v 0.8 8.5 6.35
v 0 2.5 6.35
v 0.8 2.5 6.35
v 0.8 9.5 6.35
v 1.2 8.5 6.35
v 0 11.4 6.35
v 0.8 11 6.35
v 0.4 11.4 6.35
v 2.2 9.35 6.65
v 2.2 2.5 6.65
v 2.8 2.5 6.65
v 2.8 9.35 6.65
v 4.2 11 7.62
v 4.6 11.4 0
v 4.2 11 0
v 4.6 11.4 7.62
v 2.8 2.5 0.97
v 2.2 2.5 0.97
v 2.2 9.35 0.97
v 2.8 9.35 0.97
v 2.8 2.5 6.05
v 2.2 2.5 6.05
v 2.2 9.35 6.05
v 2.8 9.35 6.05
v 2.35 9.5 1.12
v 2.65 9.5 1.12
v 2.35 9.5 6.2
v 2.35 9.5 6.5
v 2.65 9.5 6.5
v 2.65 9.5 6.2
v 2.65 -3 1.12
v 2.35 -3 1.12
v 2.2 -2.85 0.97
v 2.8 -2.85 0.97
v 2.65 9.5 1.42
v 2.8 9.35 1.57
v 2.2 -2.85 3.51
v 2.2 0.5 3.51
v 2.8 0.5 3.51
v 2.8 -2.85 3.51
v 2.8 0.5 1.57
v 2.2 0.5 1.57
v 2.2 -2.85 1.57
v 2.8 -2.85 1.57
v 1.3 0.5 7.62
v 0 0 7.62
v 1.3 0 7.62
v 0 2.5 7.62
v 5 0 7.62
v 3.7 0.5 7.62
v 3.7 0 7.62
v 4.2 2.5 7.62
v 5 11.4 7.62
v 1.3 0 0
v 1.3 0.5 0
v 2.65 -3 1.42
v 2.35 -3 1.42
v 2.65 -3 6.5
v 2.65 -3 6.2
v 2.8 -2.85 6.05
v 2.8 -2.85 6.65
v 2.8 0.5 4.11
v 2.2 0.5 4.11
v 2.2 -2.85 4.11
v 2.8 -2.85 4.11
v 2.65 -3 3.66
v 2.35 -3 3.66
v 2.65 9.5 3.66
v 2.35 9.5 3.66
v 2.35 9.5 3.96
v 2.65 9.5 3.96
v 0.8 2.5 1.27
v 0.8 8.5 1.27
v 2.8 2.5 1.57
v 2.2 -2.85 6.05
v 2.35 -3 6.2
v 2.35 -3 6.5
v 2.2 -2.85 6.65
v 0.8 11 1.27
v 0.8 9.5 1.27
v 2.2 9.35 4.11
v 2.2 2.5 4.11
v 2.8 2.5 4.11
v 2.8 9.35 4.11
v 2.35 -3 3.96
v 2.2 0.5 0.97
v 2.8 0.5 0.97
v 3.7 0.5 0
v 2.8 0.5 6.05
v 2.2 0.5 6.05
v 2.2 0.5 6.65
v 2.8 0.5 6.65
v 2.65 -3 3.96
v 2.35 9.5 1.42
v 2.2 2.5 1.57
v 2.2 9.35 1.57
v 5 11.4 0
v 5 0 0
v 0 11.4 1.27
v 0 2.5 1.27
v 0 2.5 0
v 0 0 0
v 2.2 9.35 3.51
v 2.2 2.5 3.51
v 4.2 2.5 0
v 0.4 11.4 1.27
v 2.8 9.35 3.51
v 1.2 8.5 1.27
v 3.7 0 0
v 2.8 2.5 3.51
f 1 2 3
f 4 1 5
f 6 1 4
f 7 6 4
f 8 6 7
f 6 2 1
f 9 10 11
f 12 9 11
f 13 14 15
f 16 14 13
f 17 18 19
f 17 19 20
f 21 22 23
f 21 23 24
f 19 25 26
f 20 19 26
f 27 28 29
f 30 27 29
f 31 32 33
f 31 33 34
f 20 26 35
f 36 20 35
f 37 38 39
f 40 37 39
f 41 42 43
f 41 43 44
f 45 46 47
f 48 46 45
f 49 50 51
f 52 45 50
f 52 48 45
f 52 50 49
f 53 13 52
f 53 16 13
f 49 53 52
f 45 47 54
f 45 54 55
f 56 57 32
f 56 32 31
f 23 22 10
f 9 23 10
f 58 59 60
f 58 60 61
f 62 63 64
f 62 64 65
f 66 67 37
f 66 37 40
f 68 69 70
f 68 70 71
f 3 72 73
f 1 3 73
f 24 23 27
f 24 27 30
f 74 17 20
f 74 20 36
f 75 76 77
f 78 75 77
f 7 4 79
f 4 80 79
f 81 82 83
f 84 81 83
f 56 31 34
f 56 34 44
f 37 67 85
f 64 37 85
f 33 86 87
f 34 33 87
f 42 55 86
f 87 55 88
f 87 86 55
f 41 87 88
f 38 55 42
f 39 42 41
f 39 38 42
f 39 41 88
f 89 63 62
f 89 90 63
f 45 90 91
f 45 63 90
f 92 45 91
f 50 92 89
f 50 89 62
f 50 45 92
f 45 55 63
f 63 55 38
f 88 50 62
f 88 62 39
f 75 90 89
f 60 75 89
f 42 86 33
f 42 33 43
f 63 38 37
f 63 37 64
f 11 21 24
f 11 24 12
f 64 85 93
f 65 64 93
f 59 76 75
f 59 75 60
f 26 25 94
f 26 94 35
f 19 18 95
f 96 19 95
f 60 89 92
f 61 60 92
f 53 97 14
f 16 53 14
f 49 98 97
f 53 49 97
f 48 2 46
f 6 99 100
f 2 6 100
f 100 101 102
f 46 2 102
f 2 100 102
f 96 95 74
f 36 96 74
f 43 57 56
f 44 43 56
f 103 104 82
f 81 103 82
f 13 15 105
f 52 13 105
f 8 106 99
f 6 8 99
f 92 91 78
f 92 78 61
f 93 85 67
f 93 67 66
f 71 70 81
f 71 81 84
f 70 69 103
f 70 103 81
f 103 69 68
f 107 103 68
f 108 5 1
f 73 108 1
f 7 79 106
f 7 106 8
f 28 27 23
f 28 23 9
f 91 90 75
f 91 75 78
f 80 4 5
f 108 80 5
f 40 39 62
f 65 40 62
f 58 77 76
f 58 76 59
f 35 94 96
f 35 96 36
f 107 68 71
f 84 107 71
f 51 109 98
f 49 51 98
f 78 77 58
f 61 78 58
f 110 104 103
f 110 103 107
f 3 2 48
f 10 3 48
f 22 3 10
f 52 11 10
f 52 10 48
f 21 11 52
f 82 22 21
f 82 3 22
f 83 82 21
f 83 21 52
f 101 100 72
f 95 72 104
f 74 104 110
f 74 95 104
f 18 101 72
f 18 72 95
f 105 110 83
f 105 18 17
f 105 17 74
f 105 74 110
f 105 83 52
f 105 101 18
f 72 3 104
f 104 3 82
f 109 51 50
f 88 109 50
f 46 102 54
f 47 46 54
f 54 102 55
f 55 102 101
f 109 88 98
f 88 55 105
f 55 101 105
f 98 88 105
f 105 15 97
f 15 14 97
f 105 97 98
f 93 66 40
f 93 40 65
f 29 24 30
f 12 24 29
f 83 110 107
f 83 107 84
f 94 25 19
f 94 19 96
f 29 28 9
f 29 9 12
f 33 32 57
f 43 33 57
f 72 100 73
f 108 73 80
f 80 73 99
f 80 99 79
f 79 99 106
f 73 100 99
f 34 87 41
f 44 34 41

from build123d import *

# Parameters (mm, degrees)
BOSS_EXTRU_1_DEPTH      = 7.62
ESQUISSE3_W             = 0.8
ESQUISSE3_H             = 1.27
ENL_V_MAT_EXTRU_1_DEPTH = 8.9
ESQUISSE4_W             = 2.4
ESQUISSE4_H             = 0.5
ENL_V_MAT_EXTRU_2_DEPTH = 8.62
ESQUISSE2_W             = 0.6
ESQUISSE2_H             = 0.6
BOSS_EXTRU_2_DEPTH      = 3.5
BOSS_EXTRU_2_DEPTH_BACK = 9
BOSS_EXTRU_3_DEPTH      = 5.08
CHANFREIN4_SIZE         = 0.15
CHANFREIN5_SIZE         = 0.4


with BuildPart() as part:
    # Esquisse1 → Boss.-Extru.1 (new body)
    with BuildSketch(Plane.XY):
        Polygon((0, 11.4), (0, 0), (5, 0), (5, 11.4), (4.2, 11.4), (4.2, 2.5), (0.8, 2.5), (0.8, 11.4), align=None)
    extrude(amount=BOSS_EXTRU_1_DEPTH)

    # Esquisse3 → Enlèv. mat.-Extru.1 (cut)
    with BuildSketch(Plane(origin=(0, 11.4, 0), x_dir=(1, 0, 0), z_dir=(0, 1, 0))):
        with Locations((0.4, -0.635)):
            Rectangle(ESQUISSE3_W, ESQUISSE3_H)
        with Locations((0.4, -6.985)):
            Rectangle(ESQUISSE3_W, ESQUISSE3_H)
    extrude(amount=-ENL_V_MAT_EXTRU_1_DEPTH, mode=Mode.SUBTRACT)

    # Esquisse4 → Enlèv. mat.-Extru.2 (cut, through all)
    with BuildSketch(Plane.XY.offset(7.62)):
        with Locations((2.5, 0.25)):
            Rectangle(ESQUISSE4_W, ESQUISSE4_H)
    extrude(amount=-ENL_V_MAT_EXTRU_2_DEPTH, mode=Mode.SUBTRACT)

    # Esquisse2 → Boss.-Extru.2 (add, two sides)
    with BuildSketch(Plane.XZ.offset(-0.5)) as boss_extru_2_sk:
        with Locations((2.5, 6.35)):
            Rectangle(ESQUISSE2_W, ESQUISSE2_H)
        with Locations((2.5, 1.27)):
            Rectangle(ESQUISSE2_W, ESQUISSE2_H)
        with Locations((2.5, 3.81)):
            Rectangle(ESQUISSE2_W, ESQUISSE2_H)
    extrude(amount=BOSS_EXTRU_2_DEPTH)
    extrude(boss_extru_2_sk.sketch, amount=-BOSS_EXTRU_2_DEPTH_BACK)

    # Esquisse5 → Boss.-Extru.3 (add)
    with BuildSketch(Plane.XY.offset(6.35)):
        Polygon((0.8, 9.5), (1.2, 8.5), (0.8, 8.5), align=None)
    extrude(amount=-BOSS_EXTRU_3_DEPTH)

    # Chanfrein4
    chanfrein4_edges = [part.edges().sort_by_distance(p)[0] for p in [
        (2.8, 9.5, 3.81),
        (2.5, 9.5, 3.51),
        (2.2, 9.5, 3.81),
        (2.5, 9.5, 4.11),
        (2.8, -3, 3.81),
        (2.5, -3, 4.11),
        (2.2, -3, 3.81),
        (2.5, -3, 3.51),
        (2.8, 9.5, 6.35),
        (2.5, 9.5, 6.05),
        (2.2, 9.5, 6.35),
        (2.5, 9.5, 6.65),
        (2.8, -3, 6.35),
        (2.5, -3, 6.65),
        (2.2, -3, 6.35),
        (2.5, -3, 6.05),
        (2.8, 9.5, 1.27),
        (2.5, 9.5, 0.97),
        (2.2, 9.5, 1.27),
        (2.5, 9.5, 1.57),
        (2.8, -3, 1.27),
        (2.5, -3, 1.57),
        (2.2, -3, 1.27),
        (2.5, -3, 0.97),
    ]]
    chamfer(chanfrein4_edges, length=CHANFREIN4_SIZE)

    # Chanfrein5
    chanfrein5_edges = [part.edges().sort_by_distance(p)[0] for p in [
        (4.2, 11.4, 3.81),
        (0.8, 11.4, 3.81),
    ]]
    chamfer(chanfrein5_edges, length=CHANFREIN5_SIZE)


solid = part.part
